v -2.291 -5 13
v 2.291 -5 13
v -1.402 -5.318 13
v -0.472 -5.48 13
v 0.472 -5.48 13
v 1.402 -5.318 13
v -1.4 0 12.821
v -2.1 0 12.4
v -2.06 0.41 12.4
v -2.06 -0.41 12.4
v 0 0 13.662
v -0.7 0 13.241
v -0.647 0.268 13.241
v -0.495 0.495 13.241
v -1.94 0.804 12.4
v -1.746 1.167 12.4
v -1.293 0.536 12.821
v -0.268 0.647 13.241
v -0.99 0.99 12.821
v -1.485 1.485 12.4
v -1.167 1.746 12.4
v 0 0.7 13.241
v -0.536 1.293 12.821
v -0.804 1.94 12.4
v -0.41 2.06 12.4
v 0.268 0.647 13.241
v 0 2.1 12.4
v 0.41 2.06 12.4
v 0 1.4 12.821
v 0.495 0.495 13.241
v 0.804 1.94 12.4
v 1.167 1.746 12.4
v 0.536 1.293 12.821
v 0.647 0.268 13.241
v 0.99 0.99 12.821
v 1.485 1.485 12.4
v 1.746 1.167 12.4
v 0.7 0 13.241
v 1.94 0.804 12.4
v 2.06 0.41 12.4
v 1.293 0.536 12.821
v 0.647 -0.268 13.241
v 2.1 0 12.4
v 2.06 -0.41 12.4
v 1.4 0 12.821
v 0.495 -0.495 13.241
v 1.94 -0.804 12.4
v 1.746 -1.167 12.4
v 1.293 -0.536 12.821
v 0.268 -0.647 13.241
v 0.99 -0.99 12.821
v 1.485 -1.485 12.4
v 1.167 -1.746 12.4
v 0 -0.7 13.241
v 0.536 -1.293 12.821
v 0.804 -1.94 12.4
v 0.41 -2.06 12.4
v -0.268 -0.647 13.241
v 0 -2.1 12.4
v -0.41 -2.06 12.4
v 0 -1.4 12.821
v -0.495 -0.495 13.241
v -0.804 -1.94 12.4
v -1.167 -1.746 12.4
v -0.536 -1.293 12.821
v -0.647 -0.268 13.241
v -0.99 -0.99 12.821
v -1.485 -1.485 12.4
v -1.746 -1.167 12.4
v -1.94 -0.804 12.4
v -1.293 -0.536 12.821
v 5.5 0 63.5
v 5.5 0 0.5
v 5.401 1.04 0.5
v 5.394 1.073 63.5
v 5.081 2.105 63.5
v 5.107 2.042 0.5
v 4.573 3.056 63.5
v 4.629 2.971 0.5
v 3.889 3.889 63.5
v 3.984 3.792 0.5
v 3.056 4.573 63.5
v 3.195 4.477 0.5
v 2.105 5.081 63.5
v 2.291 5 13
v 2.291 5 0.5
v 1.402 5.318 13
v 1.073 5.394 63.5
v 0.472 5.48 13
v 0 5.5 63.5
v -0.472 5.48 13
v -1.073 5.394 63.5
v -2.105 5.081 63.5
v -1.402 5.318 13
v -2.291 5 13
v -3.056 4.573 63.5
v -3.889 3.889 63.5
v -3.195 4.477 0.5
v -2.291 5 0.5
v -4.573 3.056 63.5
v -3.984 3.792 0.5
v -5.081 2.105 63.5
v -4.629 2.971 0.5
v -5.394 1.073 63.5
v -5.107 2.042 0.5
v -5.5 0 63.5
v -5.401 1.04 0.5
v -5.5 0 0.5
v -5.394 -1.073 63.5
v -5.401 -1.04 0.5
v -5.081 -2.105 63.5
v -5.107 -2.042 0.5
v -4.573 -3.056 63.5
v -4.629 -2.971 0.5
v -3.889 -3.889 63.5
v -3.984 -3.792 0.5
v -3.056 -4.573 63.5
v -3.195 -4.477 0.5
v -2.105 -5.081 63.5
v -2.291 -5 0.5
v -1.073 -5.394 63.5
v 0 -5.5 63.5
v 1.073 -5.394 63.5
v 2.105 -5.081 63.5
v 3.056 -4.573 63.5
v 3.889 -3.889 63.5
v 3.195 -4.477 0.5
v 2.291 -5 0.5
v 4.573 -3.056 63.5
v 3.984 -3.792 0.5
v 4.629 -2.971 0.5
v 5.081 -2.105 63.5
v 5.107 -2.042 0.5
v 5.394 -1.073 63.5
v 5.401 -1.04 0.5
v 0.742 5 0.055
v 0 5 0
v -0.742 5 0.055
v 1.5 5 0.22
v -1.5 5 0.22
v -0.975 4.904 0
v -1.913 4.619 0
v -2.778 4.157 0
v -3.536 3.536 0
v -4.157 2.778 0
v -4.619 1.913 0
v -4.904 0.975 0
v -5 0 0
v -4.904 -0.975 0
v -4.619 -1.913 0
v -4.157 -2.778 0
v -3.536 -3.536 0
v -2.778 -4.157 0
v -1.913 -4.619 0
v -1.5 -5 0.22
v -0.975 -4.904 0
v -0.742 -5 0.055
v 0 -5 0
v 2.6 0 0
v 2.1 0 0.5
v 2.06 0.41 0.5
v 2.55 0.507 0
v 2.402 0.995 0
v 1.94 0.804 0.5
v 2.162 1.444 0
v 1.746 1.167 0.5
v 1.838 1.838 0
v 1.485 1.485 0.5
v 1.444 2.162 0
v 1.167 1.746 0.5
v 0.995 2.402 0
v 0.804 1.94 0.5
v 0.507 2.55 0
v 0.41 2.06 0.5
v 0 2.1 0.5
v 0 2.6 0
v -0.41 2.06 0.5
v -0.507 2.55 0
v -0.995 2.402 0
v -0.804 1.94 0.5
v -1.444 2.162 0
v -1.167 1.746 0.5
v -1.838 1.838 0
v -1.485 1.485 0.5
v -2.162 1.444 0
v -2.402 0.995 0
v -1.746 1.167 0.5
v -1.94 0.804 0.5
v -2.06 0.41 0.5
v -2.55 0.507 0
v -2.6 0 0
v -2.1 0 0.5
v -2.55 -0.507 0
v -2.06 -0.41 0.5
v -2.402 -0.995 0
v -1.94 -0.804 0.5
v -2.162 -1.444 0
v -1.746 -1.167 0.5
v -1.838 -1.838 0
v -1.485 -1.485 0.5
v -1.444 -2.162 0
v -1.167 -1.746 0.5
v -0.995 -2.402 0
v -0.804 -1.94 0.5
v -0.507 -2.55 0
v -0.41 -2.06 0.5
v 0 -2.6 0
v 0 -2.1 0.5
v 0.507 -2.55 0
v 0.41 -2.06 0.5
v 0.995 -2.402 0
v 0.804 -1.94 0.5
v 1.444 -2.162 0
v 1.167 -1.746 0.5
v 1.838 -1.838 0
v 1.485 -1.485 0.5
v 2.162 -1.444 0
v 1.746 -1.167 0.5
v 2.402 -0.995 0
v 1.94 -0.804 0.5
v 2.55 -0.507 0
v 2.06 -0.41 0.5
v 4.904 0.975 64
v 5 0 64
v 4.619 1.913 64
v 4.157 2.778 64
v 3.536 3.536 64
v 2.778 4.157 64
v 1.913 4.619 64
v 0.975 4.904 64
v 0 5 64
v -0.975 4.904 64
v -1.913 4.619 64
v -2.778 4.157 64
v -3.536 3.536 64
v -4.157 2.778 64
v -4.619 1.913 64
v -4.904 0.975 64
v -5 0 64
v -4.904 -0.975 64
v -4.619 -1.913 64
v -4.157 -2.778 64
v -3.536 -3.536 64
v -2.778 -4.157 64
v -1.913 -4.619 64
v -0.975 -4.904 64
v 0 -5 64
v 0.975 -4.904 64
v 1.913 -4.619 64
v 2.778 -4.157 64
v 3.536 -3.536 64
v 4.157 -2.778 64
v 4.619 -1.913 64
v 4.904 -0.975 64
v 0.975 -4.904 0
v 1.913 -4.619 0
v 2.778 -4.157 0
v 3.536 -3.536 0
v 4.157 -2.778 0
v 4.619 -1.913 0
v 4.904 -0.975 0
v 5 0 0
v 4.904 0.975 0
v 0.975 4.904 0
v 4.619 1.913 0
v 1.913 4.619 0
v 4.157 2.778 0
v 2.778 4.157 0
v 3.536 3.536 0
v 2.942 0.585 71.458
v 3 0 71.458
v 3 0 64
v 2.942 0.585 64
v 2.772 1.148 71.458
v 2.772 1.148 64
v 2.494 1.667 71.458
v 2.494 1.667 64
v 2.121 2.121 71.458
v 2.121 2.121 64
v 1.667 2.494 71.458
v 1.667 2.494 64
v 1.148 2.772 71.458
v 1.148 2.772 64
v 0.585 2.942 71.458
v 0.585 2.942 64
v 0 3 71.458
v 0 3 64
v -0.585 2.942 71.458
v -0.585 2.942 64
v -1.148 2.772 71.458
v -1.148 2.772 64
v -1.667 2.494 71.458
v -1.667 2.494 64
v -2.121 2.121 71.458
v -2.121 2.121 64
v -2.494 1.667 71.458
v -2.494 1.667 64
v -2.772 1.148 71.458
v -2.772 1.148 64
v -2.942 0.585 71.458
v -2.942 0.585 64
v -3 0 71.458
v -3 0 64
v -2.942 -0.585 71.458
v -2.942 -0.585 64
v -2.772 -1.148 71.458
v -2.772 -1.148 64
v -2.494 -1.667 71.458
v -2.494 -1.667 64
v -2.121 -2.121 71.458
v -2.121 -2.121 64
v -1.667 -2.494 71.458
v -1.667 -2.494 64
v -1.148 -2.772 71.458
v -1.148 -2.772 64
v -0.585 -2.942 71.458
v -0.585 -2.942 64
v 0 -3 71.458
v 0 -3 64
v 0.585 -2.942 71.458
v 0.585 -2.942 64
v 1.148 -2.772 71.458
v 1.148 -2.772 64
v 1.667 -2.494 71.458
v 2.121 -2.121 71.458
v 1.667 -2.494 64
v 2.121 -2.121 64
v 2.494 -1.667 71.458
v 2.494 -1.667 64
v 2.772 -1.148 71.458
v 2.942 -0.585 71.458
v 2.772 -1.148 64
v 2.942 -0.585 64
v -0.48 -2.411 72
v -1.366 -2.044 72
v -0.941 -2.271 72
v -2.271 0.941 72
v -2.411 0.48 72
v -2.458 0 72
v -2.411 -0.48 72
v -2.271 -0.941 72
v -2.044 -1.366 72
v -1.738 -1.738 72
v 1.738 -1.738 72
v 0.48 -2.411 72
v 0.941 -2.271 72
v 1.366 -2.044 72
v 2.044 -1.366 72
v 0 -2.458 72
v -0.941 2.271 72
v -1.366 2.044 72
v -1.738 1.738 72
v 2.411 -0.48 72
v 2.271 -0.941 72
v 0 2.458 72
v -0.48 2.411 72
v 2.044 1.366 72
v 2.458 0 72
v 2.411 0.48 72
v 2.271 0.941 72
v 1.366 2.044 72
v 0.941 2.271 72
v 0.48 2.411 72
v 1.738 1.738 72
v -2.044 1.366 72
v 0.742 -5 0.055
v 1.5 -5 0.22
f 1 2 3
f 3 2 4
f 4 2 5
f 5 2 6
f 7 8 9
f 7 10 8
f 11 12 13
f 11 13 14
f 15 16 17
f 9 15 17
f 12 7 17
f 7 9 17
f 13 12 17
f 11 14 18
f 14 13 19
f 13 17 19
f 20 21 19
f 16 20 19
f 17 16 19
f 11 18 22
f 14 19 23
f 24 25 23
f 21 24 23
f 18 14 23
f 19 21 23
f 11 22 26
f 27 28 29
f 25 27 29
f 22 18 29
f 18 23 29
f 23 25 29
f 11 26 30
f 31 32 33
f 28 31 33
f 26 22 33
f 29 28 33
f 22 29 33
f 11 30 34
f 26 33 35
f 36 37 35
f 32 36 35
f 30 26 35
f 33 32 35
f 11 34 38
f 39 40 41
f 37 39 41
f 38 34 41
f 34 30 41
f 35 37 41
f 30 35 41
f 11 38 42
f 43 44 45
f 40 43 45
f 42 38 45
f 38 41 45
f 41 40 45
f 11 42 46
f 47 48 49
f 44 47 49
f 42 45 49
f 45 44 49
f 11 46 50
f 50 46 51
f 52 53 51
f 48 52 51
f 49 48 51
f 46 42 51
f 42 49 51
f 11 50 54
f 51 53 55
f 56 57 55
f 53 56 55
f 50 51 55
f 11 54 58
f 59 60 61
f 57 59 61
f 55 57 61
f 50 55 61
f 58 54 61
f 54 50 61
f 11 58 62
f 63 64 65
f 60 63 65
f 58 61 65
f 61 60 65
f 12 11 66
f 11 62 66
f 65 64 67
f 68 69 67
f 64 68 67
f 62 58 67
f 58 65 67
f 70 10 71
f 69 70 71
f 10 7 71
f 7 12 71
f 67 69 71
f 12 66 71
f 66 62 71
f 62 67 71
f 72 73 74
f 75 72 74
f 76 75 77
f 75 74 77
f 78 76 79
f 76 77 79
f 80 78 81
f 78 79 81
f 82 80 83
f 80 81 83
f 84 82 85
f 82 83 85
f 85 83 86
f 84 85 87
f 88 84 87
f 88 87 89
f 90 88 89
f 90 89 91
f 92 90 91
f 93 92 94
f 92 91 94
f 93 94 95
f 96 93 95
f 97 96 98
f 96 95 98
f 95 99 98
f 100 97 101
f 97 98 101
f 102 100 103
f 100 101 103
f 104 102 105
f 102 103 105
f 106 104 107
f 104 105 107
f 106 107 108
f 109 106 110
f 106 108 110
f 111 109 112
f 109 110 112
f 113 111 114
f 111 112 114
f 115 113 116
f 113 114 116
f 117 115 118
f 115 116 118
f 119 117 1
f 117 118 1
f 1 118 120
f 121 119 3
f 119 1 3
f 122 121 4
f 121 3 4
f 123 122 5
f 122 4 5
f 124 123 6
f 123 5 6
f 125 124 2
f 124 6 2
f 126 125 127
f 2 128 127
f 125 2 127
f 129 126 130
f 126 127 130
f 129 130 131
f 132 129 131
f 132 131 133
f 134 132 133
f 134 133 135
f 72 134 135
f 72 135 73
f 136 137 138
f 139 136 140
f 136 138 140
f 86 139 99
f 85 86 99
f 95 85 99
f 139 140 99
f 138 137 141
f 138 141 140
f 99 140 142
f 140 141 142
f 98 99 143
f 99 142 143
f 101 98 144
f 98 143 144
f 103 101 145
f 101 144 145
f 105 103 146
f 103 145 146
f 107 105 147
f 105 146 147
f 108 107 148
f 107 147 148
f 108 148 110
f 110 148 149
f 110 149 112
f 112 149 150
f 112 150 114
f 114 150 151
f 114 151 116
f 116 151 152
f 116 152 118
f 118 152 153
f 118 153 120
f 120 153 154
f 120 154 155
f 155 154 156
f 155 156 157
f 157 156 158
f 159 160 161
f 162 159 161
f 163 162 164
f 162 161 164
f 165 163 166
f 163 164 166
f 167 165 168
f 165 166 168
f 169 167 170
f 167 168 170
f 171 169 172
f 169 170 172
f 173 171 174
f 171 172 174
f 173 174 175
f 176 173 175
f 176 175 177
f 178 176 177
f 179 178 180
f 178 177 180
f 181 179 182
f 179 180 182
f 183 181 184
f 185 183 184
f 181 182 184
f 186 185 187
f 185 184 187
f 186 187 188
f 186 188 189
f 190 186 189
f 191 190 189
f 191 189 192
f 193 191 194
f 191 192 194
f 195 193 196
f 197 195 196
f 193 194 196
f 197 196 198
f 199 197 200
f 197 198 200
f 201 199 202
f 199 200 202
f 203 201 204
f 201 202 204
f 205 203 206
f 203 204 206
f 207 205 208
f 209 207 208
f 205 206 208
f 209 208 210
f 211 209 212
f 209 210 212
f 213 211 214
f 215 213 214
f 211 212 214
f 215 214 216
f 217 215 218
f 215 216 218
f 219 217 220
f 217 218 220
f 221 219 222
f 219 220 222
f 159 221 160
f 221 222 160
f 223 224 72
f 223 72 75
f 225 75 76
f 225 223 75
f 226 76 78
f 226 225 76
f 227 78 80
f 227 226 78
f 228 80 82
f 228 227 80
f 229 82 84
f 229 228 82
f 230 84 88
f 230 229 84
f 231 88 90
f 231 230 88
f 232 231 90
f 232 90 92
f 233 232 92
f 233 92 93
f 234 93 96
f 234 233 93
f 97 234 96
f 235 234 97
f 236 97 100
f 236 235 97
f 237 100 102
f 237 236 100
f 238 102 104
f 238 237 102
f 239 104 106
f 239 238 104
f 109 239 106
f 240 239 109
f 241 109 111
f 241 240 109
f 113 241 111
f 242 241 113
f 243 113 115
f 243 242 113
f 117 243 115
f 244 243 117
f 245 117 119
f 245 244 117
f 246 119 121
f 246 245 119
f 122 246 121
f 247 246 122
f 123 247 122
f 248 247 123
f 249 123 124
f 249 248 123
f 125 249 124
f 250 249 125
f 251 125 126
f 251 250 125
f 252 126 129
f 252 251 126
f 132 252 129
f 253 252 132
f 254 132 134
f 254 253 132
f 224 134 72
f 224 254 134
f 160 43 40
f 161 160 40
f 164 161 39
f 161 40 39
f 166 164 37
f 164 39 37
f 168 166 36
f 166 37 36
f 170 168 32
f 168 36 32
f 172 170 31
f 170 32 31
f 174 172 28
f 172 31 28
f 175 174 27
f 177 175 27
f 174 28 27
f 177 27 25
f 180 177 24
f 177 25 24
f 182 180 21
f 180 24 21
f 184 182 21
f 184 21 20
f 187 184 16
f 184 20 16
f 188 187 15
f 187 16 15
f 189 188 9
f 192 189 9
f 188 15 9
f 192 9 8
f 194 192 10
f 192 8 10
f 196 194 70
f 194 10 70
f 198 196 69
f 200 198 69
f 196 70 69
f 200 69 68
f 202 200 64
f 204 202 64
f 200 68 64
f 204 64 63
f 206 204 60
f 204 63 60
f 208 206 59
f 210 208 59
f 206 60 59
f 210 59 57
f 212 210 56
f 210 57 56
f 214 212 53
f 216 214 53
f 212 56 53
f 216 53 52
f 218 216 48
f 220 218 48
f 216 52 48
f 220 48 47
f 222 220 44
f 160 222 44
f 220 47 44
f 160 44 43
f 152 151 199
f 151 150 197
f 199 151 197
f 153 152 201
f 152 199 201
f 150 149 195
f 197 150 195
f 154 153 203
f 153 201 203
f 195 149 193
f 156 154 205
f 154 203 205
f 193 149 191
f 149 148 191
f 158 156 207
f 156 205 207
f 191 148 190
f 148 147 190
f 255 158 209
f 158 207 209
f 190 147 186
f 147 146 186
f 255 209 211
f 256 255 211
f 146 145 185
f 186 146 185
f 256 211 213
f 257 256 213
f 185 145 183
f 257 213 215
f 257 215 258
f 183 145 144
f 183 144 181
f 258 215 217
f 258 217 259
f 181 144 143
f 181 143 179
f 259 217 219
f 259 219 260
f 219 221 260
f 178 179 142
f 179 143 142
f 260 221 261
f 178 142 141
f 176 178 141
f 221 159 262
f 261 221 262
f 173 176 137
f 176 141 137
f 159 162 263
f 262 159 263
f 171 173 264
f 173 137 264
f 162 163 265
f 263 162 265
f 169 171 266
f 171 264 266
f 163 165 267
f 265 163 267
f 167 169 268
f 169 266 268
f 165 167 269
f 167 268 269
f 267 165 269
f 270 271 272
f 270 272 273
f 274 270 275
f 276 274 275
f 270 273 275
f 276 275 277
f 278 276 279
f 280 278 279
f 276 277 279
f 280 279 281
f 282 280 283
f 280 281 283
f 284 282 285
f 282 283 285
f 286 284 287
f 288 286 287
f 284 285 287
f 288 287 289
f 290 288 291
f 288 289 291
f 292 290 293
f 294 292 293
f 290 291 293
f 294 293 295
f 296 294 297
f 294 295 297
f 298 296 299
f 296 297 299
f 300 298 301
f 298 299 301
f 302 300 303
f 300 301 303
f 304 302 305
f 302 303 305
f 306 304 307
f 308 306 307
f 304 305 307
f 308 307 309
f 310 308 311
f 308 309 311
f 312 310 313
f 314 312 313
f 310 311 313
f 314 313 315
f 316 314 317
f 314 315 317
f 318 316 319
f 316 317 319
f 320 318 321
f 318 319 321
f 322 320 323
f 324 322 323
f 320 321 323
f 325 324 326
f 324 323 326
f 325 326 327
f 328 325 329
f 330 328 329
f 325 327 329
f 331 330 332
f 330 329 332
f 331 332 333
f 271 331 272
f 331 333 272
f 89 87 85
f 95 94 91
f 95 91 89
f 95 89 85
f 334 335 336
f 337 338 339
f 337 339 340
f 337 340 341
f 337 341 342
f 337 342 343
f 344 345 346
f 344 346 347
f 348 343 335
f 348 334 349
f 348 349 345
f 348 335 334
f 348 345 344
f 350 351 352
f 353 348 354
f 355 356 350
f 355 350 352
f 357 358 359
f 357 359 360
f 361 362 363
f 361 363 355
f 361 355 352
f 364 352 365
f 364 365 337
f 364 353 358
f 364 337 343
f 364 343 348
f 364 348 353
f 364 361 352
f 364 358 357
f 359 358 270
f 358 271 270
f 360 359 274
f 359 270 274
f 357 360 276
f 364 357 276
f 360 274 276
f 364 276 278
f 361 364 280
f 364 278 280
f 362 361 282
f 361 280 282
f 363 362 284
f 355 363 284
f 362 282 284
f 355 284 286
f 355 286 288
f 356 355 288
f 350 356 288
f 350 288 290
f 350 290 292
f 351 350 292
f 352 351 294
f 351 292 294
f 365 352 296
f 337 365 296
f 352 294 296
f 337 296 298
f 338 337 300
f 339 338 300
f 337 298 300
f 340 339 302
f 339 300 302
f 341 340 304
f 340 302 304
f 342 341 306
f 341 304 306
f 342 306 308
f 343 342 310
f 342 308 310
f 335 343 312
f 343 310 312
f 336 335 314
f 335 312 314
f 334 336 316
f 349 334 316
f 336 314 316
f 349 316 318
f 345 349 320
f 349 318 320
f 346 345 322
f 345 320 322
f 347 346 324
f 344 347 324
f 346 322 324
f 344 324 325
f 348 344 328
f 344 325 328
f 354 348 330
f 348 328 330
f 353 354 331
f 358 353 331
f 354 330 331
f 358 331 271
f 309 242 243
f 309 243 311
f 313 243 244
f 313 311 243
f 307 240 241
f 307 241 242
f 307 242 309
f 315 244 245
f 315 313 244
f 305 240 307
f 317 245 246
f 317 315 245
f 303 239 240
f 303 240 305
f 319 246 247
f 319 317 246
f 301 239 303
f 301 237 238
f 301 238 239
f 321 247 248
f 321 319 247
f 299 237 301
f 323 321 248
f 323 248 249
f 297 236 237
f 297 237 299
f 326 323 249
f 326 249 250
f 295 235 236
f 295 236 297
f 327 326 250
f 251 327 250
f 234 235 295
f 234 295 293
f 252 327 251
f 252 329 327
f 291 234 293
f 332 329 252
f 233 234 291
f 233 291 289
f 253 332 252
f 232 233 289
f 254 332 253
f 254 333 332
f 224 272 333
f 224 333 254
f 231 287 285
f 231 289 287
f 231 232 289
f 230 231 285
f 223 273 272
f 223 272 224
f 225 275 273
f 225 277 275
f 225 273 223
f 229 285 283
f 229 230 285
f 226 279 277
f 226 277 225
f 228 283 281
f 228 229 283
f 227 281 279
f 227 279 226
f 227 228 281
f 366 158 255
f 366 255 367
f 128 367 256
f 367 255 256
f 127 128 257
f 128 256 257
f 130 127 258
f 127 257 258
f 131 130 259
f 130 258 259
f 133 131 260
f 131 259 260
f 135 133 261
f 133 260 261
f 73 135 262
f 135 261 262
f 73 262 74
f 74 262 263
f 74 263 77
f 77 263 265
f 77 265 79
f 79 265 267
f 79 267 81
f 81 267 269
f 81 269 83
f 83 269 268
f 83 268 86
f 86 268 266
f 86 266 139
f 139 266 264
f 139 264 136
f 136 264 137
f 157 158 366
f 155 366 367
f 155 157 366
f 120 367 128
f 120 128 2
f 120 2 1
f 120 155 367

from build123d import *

# Parameters (mm, degrees)
SKETCH_1_R             = 5.5
EXTRUDE_1_DEPTH        = 64
CHAMFER_1_SIZE         = 0.5
SKETCH_2_R             = 3.3
EXTRUDE_2_DEPTH        = 8
HOLE_WIZARD_M5_1_D     = 4.2
HOLE_WIZARD_M5_1_DEPTH = 12.4
HOLE_WIZARD_M5_1_TIP   = 1.2618073
CHAMFER_3_SIZE         = 0.5
SKETCH_6_W             = 10
SKETCH_6_H             = 3
CUT_EXTRUDE_1_DEPTH    = 13


# Read off the part's stored shape, not the designer's step: M6 机械螺纹 螺柱1
with BuildPart() as part:
    # 草图1 → 拉伸1 (new body)
    with BuildSketch(Plane.XY):
        Circle(SKETCH_1_R)
    extrude(amount=EXTRUDE_1_DEPTH)

    # 倒角1
    chamfer_1_edges = [part.edges().sort_by_distance(p)[0] for p in [
        (-5.5, 0, 0),
        (-5.5, 0, 64),
    ]]
    chamfer(chamfer_1_edges, length=CHAMFER_1_SIZE)

    # 草图2 → 拉伸2 (add)
    with BuildSketch(Plane.XY.offset(64)):
        Circle(SKETCH_2_R)
    extrude(amount=EXTRUDE_2_DEPTH)

    # M5 螺纹孔1
    with Locations(Plane(origin=(0, 0, 0), x_dir=(-1, 0, 0), z_dir=(0, 0, -1))):
        with Locations((0, 0)):
            Hole(HOLE_WIZARD_M5_1_D / 2, depth=HOLE_WIZARD_M5_1_DEPTH)
            with Locations((0, 0, -(HOLE_WIZARD_M5_1_DEPTH + HOLE_WIZARD_M5_1_TIP / 2))):  # 118° drill point
                Cone(0, HOLE_WIZARD_M5_1_D / 2, HOLE_WIZARD_M5_1_TIP, mode=Mode.SUBTRACT)

    # 倒角3
    chamfer_3_edges = [part.edges().sort_by_distance(p)[0] for p in [
        (-2.1, 0, 0),
    ]]
    chamfer(chamfer_3_edges, length=CHAMFER_3_SIZE)

    # 草图6 → 切除-拉伸1 (cut)
    with BuildSketch(Plane(origin=(0, 0, 0), x_dir=(-1, 0, 0), z_dir=(0, 0, -1))):
        with Locations((0, 6.5)):
            Rectangle(SKETCH_6_W, SKETCH_6_H)
        with Locations((0, -6.5)):
            Rectangle(SKETCH_6_W, SKETCH_6_H)
    extrude(amount=-CUT_EXTRUDE_1_DEPTH, mode=Mode.SUBTRACT)

    # M6 机械螺纹 螺柱1 outline → M6 机械螺纹 螺柱1 (revolve, cut)
    with BuildSketch(Plane.XZ):
        Polygon((3.3, 72), (2.4585, 72), (3, 71.4585), (3, 64), (3.3, 64), align=None)
    revolve(axis=Axis((0, 0, 0), (0, 0, 1)), mode=Mode.SUBTRACT)


solid = part.part
